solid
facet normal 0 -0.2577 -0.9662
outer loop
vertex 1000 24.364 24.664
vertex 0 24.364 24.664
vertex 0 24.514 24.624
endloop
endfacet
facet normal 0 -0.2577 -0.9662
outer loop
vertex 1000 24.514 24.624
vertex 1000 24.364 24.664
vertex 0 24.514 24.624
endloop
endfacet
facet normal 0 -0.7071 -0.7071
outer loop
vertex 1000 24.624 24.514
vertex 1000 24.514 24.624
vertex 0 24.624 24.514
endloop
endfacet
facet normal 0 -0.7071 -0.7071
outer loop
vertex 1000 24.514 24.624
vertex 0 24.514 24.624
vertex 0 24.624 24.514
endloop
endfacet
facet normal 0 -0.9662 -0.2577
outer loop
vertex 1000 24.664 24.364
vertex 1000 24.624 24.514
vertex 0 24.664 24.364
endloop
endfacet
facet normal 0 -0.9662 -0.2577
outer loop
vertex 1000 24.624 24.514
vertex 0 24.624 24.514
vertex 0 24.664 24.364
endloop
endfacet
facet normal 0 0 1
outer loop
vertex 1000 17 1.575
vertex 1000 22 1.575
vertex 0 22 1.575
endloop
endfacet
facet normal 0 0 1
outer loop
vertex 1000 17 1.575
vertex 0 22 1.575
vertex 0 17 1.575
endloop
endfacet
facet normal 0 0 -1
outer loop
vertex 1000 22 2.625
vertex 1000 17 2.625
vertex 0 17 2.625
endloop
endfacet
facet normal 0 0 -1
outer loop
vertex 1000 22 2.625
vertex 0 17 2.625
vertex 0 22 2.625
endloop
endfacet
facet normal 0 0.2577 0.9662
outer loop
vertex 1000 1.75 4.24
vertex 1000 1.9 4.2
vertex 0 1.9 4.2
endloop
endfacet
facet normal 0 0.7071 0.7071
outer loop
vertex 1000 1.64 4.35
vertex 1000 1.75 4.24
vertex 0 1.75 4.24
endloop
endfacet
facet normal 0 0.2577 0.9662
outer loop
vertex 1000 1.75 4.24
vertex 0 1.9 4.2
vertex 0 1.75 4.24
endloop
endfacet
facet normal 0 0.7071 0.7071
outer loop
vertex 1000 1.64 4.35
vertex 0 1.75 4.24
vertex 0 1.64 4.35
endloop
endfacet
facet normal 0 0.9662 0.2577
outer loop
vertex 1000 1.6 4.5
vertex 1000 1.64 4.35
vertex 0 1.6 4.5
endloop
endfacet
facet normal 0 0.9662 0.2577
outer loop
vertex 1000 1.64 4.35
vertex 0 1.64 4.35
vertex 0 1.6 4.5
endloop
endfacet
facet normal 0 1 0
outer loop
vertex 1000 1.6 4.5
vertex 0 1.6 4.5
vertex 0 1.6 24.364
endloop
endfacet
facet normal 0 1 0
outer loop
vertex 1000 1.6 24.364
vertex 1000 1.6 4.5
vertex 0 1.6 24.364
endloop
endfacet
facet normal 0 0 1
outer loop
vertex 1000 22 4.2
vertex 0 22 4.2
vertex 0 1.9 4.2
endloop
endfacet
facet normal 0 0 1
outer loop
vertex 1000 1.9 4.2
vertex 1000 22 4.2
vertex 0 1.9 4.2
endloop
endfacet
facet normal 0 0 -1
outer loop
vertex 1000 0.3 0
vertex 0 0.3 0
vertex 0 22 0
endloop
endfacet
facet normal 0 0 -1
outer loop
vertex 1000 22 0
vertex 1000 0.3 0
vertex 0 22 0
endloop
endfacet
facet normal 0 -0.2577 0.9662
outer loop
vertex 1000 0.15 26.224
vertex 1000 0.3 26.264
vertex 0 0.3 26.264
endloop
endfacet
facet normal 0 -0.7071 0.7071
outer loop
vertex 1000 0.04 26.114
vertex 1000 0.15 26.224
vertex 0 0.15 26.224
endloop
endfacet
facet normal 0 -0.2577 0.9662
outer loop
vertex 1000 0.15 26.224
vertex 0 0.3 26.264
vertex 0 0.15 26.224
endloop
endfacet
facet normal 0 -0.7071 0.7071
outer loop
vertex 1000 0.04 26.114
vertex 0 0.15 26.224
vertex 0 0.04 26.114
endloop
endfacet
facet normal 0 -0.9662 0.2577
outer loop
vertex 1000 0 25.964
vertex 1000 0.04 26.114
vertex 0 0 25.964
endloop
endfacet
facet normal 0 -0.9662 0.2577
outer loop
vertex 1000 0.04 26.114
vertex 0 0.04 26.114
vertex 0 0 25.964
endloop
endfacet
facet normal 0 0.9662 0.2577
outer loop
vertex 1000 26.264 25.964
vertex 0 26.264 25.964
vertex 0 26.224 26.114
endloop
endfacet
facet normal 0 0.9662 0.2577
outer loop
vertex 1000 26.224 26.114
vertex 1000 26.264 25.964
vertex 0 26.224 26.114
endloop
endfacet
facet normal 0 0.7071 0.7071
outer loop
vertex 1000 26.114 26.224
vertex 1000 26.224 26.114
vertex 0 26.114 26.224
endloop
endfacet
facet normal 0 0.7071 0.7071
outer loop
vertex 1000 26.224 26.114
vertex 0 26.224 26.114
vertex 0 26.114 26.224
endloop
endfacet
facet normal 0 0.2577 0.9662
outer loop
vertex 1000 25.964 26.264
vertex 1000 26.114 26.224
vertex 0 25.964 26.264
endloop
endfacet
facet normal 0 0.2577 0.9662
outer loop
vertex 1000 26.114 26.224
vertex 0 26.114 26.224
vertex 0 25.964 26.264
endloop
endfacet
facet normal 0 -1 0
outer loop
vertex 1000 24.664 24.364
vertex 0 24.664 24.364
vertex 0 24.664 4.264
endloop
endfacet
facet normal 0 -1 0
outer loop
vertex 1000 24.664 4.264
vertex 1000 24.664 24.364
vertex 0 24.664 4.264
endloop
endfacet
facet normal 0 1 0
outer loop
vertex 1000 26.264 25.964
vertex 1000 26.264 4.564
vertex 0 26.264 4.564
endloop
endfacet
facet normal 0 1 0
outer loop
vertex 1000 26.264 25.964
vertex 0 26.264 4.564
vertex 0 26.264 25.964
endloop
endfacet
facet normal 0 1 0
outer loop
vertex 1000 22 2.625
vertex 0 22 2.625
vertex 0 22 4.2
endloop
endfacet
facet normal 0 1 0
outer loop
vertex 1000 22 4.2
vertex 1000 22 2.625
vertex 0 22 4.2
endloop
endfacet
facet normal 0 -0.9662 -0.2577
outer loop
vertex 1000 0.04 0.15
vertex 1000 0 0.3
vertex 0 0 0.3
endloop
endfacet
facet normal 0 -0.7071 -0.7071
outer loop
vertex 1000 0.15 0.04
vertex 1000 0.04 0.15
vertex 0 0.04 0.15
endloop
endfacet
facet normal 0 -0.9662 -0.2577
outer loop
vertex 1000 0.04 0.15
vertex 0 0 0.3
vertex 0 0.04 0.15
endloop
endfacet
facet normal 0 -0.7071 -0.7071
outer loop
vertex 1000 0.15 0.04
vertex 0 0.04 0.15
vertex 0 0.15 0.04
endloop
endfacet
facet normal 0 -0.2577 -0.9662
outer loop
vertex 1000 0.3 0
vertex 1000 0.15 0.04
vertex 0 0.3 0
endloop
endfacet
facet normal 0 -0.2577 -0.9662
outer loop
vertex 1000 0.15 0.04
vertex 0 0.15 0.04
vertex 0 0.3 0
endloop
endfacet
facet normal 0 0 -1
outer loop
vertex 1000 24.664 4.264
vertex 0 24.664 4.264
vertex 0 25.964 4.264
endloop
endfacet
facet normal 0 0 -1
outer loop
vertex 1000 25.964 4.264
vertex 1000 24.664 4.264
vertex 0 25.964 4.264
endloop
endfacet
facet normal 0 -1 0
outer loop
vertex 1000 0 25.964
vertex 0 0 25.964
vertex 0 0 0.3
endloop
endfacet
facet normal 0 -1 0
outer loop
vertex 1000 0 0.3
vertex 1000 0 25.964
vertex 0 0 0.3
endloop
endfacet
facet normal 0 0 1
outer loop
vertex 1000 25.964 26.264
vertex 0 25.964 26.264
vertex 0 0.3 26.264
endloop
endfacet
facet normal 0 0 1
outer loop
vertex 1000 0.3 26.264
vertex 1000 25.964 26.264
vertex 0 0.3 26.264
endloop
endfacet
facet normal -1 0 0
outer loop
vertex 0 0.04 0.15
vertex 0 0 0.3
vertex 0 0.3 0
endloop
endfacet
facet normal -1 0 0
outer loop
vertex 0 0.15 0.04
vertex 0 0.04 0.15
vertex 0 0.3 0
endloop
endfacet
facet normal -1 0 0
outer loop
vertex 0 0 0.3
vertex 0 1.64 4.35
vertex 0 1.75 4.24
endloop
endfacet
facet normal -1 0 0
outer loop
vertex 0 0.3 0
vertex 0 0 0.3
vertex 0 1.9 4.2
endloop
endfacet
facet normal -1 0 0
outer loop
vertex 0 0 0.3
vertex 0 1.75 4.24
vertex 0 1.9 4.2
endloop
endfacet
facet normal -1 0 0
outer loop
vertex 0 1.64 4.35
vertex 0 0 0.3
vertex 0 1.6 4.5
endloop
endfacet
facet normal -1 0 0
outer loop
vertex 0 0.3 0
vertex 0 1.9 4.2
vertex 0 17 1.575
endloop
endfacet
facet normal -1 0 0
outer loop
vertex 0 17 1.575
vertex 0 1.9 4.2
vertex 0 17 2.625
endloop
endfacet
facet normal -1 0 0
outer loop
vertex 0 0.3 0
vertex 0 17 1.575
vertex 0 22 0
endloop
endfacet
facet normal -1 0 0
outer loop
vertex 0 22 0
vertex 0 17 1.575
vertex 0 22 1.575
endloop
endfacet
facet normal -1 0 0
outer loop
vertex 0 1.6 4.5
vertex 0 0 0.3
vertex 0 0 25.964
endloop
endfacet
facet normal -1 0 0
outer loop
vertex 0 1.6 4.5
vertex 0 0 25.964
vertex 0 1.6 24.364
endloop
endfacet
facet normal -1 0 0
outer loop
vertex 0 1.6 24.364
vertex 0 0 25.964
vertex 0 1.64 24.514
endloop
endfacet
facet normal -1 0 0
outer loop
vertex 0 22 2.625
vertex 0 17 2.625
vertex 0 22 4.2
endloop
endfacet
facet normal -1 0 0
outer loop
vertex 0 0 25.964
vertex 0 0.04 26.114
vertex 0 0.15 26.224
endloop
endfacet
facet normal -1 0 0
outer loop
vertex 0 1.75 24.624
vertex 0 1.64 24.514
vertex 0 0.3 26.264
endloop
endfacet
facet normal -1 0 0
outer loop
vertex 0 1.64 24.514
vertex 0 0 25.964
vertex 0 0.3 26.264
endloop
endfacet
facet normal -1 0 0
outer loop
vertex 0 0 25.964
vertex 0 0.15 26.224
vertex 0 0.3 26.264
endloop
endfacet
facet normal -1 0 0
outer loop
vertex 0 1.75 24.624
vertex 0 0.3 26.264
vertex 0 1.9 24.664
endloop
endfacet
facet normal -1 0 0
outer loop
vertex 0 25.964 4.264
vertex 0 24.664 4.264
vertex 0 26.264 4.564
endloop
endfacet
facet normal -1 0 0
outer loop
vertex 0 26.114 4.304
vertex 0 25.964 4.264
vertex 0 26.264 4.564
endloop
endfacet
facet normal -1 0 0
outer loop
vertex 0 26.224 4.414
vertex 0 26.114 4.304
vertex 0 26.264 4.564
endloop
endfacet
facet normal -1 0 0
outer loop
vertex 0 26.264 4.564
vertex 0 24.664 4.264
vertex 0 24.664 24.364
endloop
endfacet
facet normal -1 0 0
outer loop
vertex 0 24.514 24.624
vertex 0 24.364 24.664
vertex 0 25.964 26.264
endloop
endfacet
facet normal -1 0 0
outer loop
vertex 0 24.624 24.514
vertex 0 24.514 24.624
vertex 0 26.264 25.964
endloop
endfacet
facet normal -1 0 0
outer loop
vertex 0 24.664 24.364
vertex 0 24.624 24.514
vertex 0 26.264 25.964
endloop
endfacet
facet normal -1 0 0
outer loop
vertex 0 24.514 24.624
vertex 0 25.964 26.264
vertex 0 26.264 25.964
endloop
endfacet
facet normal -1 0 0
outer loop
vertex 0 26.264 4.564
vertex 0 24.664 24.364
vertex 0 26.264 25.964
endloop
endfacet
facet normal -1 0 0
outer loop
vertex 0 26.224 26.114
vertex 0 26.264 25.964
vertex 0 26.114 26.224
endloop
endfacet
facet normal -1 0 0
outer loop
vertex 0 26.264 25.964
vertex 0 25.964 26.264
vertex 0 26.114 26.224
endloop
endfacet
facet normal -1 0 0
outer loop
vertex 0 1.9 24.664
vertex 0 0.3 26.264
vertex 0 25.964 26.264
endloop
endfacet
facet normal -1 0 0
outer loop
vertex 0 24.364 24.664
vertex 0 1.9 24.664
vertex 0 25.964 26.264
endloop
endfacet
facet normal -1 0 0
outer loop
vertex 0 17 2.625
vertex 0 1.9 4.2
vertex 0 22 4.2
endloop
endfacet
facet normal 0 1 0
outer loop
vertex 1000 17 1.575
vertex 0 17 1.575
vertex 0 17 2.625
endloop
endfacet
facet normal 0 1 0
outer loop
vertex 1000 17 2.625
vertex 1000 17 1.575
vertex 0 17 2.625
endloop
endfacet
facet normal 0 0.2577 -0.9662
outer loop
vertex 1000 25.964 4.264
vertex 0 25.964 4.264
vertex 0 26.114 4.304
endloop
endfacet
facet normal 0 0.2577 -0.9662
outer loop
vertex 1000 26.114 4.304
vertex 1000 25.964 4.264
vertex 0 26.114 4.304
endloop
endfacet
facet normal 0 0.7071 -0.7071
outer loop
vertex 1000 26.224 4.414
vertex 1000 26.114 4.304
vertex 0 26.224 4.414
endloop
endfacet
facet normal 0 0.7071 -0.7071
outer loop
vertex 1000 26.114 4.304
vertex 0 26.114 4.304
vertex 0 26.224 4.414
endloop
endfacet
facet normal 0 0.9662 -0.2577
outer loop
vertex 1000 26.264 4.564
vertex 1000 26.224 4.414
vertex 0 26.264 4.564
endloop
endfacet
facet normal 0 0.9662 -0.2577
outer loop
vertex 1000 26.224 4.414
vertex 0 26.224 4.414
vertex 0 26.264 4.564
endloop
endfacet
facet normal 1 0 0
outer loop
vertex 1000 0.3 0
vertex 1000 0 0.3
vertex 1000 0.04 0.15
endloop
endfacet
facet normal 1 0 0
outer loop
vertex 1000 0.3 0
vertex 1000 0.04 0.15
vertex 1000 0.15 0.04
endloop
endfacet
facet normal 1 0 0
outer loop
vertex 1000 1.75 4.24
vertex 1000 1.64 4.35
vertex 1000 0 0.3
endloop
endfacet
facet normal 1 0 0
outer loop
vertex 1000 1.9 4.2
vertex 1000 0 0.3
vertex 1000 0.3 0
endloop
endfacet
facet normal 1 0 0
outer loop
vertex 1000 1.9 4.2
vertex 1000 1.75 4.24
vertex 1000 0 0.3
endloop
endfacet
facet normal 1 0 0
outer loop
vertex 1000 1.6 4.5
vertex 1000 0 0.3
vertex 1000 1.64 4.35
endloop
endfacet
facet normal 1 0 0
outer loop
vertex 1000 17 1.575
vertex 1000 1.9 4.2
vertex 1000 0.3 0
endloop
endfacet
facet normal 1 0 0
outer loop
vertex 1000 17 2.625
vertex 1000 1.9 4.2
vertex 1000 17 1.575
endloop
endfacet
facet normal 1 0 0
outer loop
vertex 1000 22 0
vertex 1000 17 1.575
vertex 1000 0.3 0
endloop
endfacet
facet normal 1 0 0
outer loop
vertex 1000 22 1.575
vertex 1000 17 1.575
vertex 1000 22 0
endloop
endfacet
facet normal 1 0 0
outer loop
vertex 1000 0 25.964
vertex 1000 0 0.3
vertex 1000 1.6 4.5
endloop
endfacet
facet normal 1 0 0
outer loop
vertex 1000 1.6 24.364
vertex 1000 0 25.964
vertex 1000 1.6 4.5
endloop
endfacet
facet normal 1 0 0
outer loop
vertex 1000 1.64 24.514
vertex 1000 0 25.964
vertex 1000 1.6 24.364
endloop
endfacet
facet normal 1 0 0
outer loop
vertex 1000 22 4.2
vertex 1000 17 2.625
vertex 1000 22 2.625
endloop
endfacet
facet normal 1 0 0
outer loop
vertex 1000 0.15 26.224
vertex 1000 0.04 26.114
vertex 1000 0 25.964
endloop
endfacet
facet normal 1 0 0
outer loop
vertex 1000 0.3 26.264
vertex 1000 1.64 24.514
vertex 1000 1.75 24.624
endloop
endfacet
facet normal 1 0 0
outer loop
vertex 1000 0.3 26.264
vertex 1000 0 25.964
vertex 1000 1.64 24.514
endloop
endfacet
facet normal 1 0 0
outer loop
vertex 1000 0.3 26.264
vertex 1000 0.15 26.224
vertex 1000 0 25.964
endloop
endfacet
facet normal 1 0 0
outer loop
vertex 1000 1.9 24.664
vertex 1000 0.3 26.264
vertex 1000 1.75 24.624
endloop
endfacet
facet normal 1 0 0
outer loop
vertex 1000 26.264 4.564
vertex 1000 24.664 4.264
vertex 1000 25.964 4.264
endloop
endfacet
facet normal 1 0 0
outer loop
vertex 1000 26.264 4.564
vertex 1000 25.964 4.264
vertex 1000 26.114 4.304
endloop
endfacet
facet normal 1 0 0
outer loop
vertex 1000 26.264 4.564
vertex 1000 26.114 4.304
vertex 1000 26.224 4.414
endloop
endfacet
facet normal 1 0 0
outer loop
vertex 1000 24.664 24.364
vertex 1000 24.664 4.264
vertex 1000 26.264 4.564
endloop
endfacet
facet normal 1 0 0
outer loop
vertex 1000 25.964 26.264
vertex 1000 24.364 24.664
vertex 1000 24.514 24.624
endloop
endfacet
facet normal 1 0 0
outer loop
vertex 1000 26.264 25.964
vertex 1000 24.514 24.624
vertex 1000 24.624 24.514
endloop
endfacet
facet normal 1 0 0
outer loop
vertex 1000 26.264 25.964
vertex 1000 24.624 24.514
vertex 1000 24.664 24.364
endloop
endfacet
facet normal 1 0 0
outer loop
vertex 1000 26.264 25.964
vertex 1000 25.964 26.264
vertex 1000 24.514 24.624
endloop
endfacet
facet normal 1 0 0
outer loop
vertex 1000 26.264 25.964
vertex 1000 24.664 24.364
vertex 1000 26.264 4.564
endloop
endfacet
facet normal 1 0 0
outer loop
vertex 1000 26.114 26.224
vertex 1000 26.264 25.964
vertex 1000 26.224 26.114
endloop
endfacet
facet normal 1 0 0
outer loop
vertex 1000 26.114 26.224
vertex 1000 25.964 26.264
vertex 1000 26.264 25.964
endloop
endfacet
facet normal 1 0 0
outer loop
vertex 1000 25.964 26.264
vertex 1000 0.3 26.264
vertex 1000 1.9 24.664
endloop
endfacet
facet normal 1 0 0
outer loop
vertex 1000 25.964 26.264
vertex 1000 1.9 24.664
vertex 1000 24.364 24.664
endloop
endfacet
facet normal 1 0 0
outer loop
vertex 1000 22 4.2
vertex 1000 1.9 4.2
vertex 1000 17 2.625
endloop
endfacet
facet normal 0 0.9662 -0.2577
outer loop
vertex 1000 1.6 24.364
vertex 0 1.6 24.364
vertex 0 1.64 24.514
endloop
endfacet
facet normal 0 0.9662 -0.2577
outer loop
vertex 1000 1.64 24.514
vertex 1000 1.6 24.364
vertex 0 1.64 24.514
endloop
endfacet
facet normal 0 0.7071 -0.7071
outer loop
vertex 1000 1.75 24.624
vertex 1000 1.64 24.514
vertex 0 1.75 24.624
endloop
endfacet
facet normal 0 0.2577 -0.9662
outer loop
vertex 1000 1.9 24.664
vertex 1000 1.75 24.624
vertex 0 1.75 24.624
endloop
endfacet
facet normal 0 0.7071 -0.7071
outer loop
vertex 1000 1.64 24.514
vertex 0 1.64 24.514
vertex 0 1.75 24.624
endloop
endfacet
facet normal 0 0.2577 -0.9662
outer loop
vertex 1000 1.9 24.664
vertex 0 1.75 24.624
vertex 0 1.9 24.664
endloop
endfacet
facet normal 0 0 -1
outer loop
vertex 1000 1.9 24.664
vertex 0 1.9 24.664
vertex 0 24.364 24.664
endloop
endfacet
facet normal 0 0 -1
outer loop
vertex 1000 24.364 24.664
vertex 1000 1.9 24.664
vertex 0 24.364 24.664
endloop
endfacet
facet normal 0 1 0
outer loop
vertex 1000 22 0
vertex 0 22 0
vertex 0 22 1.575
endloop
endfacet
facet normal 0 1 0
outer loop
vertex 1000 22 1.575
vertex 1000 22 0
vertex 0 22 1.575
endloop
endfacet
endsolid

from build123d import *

# Parameters (mm, degrees)
F1_DEPTH = 1000


with BuildPart() as f1:
    # F0 (on Right) → F1 (new body)
    with BuildSketch(Plane.YZ):
        with BuildLine():
            ThreePointArc((26.264214, 25.964214), (26.176346, 26.176346), (25.964214, 26.264214))
            Line((25.964214, 26.264214), (0.3, 26.264214))
            ThreePointArc((0.3, 26.264214), (0.087868, 26.176346), (0, 25.964214))
            Line((0, 25.964214), (0, 0.3))
            ThreePointArc((0, 0.3), (0.087868, 0.087868), (0.3, 0))
            Line((0.3, 0), (22, 0))
            Line((22, 0), (22, 1.575))
            Line((22, 1.575), (17, 1.575))
            Line((17, 1.575), (17, 2.625))
            Line((17, 2.625), (22, 2.625))
            Line((22, 2.625), (22, 4.2))
            Line((22, 4.2), (1.9, 4.2))
            ThreePointArc((1.9, 4.2), (1.687868, 4.287868), (1.6, 4.5))
            Line((1.6, 4.5), (1.6, 24.364214))
            ThreePointArc((1.6, 24.364214), (1.687868, 24.576346), (1.9, 24.664214))
            Line((1.9, 24.664214), (24.364214, 24.664214))
            ThreePointArc((24.364214, 24.664214), (24.576346, 24.576346), (24.664214, 24.364214))
            Line((24.664214, 24.364214), (24.664214, 4.264214))
            Line((24.664214, 4.264214), (25.964214, 4.264214))
            ThreePointArc((25.964214, 4.264214), (26.176346, 4.352082), (26.264214, 4.564214))
            Line((26.264214, 4.564214), (26.264214, 25.964214))
        make_face()
    extrude(amount=F1_DEPTH)


solid = f1.part
